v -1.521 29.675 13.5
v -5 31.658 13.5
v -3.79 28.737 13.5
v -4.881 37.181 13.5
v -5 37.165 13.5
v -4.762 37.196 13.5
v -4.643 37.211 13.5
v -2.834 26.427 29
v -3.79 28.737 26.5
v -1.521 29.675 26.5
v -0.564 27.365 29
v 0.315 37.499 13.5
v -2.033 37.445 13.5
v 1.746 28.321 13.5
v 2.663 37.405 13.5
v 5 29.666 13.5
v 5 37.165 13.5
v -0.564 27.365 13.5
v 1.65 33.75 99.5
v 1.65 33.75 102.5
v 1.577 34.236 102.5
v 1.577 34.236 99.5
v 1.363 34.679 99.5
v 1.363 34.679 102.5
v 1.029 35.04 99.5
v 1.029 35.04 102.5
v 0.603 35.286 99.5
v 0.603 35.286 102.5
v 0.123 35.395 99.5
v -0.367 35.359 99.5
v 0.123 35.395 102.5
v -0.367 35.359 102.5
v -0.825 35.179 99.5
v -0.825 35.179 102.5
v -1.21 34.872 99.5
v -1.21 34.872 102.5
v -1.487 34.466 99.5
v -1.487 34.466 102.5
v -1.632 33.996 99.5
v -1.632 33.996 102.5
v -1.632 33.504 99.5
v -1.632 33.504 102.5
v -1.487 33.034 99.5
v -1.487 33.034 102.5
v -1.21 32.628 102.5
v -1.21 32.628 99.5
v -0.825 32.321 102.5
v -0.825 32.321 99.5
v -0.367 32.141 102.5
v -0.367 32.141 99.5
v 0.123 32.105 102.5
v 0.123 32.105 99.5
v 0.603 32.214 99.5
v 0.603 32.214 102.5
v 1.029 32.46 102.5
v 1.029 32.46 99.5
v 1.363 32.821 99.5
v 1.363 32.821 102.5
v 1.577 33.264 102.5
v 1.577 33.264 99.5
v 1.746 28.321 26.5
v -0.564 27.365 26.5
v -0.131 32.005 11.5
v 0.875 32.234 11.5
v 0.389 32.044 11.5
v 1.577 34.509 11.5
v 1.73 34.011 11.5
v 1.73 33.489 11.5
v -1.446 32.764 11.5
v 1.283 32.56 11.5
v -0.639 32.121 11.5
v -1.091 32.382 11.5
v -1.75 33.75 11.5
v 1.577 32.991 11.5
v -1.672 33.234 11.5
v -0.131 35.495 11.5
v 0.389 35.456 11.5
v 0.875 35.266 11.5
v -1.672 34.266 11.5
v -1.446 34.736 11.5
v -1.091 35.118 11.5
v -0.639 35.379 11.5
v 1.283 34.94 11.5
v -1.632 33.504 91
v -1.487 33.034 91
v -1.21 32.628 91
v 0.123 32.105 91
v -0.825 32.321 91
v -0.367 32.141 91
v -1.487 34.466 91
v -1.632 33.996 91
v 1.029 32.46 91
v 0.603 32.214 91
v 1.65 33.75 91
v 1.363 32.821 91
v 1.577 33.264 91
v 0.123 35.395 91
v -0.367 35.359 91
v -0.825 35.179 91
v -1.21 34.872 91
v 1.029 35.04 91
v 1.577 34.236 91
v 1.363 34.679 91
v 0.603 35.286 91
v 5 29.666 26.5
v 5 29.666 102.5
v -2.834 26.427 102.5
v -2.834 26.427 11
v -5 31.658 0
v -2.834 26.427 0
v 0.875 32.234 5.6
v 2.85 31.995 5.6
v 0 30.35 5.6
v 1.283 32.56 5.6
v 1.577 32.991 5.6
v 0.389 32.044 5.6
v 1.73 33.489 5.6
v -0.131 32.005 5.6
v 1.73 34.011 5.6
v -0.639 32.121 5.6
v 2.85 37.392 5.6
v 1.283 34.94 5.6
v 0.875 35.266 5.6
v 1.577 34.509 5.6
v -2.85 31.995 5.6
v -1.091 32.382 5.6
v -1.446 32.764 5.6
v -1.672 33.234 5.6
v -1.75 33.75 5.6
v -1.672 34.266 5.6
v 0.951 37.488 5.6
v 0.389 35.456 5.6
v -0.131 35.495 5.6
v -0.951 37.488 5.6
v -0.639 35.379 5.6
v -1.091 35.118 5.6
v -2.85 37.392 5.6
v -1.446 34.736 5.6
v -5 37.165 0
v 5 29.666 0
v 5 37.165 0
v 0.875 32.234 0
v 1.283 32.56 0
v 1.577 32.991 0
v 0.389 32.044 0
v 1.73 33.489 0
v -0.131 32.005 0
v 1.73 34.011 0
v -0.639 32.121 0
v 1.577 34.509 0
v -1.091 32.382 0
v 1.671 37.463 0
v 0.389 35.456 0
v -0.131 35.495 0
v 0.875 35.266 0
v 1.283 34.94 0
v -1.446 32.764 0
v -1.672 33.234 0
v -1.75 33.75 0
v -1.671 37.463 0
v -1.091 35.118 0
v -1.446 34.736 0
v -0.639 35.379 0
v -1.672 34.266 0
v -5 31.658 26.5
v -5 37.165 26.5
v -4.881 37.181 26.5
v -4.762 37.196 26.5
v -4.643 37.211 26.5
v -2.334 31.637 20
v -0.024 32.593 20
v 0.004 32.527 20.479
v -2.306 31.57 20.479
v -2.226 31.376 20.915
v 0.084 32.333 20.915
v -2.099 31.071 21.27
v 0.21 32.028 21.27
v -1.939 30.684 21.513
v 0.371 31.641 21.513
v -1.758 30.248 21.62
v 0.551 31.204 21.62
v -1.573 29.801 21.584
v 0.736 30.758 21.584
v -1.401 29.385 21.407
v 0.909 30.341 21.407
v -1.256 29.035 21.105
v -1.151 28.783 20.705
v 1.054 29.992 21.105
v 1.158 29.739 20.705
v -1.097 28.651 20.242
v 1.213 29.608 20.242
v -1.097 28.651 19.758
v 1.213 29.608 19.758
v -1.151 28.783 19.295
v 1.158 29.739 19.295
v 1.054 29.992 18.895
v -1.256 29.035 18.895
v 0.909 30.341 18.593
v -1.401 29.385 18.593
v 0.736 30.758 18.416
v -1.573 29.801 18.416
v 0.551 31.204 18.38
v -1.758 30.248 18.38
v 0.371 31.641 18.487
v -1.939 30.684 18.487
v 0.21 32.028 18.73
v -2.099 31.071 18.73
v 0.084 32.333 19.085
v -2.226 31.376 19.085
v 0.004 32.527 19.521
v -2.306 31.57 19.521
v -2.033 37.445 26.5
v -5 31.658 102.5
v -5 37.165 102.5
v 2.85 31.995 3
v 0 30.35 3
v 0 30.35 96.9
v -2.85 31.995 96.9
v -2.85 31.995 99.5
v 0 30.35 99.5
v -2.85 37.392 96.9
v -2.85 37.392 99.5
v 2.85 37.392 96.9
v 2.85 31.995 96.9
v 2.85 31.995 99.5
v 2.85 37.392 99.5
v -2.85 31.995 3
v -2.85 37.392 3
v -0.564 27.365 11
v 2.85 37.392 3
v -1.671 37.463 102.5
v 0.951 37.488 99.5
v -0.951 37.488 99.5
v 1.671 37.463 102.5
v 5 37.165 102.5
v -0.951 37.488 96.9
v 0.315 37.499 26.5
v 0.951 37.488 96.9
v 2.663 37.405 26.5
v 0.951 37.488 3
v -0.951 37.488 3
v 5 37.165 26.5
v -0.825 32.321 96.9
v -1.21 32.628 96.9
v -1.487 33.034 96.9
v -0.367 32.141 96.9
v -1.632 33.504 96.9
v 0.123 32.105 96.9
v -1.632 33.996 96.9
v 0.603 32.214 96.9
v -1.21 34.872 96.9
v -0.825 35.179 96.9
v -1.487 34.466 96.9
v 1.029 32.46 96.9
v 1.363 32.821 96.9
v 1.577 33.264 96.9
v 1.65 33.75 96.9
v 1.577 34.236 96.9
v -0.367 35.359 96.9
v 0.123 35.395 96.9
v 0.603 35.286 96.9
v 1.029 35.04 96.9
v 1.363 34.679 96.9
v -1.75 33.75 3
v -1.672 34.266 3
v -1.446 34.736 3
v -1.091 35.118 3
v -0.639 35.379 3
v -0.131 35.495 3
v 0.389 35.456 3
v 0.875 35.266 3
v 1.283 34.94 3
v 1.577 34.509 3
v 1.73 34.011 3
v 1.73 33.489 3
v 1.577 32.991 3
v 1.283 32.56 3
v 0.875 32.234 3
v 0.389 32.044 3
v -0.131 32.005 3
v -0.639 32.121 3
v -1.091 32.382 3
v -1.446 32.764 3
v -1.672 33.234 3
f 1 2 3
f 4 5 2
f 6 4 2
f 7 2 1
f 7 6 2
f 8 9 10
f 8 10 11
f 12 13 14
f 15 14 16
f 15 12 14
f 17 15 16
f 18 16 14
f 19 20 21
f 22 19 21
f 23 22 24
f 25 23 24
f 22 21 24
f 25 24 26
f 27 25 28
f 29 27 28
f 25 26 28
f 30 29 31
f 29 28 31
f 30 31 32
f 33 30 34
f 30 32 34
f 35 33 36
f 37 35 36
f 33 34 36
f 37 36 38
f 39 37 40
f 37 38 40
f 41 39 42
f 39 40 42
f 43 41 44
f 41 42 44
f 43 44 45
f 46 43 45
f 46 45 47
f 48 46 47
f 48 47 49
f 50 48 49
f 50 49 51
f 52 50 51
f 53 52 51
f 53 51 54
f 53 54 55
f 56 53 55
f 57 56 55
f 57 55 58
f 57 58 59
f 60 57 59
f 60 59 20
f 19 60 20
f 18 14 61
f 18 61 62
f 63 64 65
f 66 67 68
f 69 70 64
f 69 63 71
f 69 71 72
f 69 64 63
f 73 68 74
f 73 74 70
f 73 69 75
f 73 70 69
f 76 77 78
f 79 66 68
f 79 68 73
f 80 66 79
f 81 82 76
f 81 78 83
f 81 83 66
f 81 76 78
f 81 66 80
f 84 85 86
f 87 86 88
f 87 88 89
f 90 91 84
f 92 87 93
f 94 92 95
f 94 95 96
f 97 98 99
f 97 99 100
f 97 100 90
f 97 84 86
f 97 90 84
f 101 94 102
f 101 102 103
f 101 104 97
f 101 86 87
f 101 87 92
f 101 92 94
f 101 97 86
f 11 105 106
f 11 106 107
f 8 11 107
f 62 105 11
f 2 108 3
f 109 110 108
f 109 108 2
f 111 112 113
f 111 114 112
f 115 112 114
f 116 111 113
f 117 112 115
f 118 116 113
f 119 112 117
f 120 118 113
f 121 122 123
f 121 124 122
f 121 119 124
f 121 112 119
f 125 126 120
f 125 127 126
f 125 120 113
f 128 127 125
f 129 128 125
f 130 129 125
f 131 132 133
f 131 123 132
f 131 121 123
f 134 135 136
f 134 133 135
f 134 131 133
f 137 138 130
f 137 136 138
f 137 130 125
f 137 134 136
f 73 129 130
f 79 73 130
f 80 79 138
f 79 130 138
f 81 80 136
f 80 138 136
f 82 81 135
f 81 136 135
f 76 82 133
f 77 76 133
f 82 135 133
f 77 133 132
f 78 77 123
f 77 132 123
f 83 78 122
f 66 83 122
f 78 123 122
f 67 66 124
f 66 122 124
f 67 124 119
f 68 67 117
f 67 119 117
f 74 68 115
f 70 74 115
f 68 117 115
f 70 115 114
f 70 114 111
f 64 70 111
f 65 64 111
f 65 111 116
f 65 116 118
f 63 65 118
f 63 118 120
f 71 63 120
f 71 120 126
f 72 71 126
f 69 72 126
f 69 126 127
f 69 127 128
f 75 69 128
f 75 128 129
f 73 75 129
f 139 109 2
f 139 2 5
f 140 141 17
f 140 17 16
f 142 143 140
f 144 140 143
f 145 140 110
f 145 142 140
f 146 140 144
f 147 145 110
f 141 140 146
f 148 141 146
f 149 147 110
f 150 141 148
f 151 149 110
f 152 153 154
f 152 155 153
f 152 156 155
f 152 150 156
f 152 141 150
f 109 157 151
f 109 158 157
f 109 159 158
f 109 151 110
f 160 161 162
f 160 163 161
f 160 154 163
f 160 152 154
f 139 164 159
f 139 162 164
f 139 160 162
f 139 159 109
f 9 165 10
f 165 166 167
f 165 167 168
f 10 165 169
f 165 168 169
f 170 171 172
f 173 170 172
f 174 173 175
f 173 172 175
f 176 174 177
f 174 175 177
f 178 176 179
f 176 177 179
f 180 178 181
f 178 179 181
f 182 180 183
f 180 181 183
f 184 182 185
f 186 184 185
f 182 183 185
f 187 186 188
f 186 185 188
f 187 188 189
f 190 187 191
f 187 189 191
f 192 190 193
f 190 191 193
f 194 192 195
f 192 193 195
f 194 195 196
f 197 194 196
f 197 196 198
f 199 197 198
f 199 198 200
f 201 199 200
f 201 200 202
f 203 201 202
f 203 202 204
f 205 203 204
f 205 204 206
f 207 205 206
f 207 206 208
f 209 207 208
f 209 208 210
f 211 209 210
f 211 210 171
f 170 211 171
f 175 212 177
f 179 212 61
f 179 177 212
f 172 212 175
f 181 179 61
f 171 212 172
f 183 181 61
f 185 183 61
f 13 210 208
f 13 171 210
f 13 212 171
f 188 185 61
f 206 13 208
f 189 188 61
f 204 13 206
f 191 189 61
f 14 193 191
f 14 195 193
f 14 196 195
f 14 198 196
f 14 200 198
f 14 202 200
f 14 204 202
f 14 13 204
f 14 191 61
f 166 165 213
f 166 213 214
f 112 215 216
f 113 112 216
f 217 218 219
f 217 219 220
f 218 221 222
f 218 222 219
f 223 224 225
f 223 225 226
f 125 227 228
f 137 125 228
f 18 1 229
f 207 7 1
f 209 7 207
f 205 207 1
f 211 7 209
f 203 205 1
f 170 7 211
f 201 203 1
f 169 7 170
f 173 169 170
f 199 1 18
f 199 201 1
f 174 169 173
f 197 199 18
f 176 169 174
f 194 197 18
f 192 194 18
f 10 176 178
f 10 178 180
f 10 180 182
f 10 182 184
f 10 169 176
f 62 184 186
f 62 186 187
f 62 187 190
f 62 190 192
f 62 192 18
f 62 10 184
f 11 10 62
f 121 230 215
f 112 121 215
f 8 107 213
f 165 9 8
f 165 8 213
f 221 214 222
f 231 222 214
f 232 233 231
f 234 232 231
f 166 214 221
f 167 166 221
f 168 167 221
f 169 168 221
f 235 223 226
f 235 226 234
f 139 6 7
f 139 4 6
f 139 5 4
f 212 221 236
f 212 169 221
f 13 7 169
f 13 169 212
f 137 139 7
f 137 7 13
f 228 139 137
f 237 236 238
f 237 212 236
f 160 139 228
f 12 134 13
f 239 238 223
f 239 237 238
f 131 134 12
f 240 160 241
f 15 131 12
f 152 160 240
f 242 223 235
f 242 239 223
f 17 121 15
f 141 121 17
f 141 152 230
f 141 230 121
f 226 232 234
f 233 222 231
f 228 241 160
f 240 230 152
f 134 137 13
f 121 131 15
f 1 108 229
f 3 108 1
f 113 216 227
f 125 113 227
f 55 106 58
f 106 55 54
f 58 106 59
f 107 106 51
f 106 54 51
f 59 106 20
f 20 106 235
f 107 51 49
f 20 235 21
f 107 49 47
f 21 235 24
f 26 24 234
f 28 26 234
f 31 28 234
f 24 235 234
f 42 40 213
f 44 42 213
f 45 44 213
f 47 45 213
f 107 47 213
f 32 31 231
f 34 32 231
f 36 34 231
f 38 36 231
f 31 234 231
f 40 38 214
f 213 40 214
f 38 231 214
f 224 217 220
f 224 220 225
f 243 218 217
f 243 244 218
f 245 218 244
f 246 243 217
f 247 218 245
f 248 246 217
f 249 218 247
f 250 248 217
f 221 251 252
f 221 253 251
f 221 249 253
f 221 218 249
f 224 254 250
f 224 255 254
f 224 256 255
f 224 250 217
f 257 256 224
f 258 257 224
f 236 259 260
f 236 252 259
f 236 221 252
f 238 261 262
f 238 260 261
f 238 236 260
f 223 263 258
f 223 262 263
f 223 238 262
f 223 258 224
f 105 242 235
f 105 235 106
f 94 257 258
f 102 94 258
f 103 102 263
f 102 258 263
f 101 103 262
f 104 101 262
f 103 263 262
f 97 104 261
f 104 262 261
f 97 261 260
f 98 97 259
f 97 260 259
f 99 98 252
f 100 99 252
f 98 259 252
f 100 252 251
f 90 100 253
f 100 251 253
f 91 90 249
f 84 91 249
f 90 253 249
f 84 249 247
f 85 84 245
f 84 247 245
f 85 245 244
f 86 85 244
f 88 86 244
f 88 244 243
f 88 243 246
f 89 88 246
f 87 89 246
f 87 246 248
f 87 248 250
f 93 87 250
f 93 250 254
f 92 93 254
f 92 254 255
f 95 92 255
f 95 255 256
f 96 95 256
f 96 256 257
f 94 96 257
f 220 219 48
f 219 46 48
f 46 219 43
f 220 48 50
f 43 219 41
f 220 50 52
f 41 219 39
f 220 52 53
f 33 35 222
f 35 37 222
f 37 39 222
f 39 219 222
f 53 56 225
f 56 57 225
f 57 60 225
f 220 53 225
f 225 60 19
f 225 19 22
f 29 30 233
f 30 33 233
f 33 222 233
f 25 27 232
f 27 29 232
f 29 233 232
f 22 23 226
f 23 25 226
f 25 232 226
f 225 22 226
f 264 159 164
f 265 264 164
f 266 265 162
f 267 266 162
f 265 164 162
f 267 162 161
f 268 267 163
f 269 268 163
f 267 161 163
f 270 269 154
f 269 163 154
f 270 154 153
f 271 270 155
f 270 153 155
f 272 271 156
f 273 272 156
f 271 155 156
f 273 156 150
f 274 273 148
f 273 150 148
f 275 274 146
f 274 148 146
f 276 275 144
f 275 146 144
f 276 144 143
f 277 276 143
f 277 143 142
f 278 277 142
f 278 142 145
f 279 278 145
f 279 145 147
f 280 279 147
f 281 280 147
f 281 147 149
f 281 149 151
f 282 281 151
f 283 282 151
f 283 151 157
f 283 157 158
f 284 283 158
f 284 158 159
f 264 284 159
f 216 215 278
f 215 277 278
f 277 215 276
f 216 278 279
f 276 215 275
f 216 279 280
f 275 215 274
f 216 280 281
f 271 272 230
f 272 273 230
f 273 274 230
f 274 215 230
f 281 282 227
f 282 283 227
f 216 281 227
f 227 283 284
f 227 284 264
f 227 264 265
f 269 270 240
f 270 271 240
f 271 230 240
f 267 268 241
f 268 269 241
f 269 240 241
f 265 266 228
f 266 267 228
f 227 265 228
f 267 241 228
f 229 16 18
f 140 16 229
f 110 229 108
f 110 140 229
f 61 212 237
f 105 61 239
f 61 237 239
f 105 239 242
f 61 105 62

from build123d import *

# Parameters (mm, degrees)
BOSS_EXTRU_2_DEPTH       = 102.5
ESQUISSE8_R              = 1.75
ENL_V_MAT_EXTRU_5_DEPTH  = 11.5
ENL_V_START              = -3
ENL_V_MAT_EXTRU_6_DEPTH  = 2.6
ENL_V_START_2            = -89
ENL_V_MAT_EXTRU_11_DEPTH = 13
ESQUISSE15_R             = 1.625
ENL_V_MAT_EXTRU_12_DEPTH = 109.858621468
CHANFREIN1_SIZE          = 2.5
ESQUISSE16_R             = 1.65
ENL_V_MAT_EXTRU_13_DEPTH = 11.5
ENL_V_START_3            = -5.6
ENL_V_MAT_EXTRU_14_DEPTH = 2.6


with BuildPart() as part:
    # Esquisse3 → Boss.-Extru.2 (new body)
    with BuildSketch(Plane.XY):
        with BuildLine():
            Line((5, 29.665669478), (-2.833530831, 26.427314208))
            Line((-2.833530831, 26.427314208), (-5, 31.657633458))
            Line((-5, 31.657633458), (-5, 37.165171868))
            ThreePointArc((-5, 37.165171868), (0, 37.5), (5, 37.165171868))
            Line((5, 37.165171868), (5, 29.665669478))
        make_face()
    extrude(amount=BOSS_EXTRU_2_DEPTH)

    # Esquisse8 → Enlèv. mat.-Extru.5 (cut)
    with BuildSketch(Plane(origin=(0, 0, 0), x_dir=(-1, 0, 0), z_dir=(0, 0, -1))):
        with Locations((0, 33.75)):
            Circle(ESQUISSE8_R)
    extrude(amount=-ENL_V_MAT_EXTRU_5_DEPTH, mode=Mode.SUBTRACT)

    # Esquisse9 → Enlèv. mat.-Extru.6 (cut)
    with BuildSketch(Plane(origin=(0, 0, 0), x_dir=(-1, 0, 0), z_dir=(0, 0, -1)).offset(ENL_V_START)):
        with BuildLine():
            Line((-2.85, 37.391543162), (-2.85, 31.995448267))
            Line((-2.85, 31.995448267), (0, 30.35))
            Line((0, 30.35), (2.85, 31.995448267))
            Line((2.85, 31.995448267), (2.85, 37.391543162))
            ThreePointArc((2.85, 37.391543162), (0, 37.5), (-2.85, 37.391543162))
        make_face()
    extrude(amount=-ENL_V_MAT_EXTRU_6_DEPTH, mode=Mode.SUBTRACT)

    # Esquisse14 → Enlèv. mat.-Extru.11 (cut)
    with BuildSketch(Plane.XY.offset(102.5).offset(ENL_V_START_2)):
        with BuildLine():
            Line((-2.833530831, 26.427314208), (-0.564385746, 27.365371146))
            Line((-0.564385746, 27.365371146), (-4.642779542, 37.211484761))
            ThreePointArc((-4.642779542, 37.211484761), (-4.821445379, 37.188757232), (-5, 37.165171868))
            Line((-5, 37.165171868), (-5, 31.657633458))
            Line((-5, 31.657633458), (-2.833530831, 26.427314208))
        make_face()
        with BuildLine():
            Line((1.745788964, 28.320930853), (-0.564385746, 27.365371146))
            Line((-0.564385746, 27.365371146), (5, 29.665669478))
            Line((5, 29.665669478), (5, 37.165171868))
            ThreePointArc((5, 37.165171868), (1.48984988, 37.470392943), (-2.03345257, 37.444827021))
            Line((-2.03345257, 37.444827021), (1.745788964, 28.320930853))
        make_face()
    extrude(amount=ENL_V_MAT_EXTRU_11_DEPTH, mode=Mode.SUBTRACT)

    # Esquisse15 → Enlèv. mat.-Extru.12 (cut, through all)
    with BuildSketch(Plane(origin=(11.503085218, 4.764733906, 0), x_dir=(0, 0, -1), z_dir=(0.9238795325112864, 0.38268343236509095, 0))):
        with Locations(Location((-20, 28.49654364, 0), (0, 0, 90))):
            Circle(ESQUISSE15_R)
    extrude(amount=-ENL_V_MAT_EXTRU_12_DEPTH, mode=Mode.SUBTRACT)

    # Chanfrein1
    # the kernel refuses this chamfer: 2.5 mm, written as the material it takes off along each edge
    with BuildSketch(Plane(origin=(-8.775058658, 23.971106609, 13.5), x_dir=(0.010504495520027614, -0.025410210633805018, -0.9996219169112968), z_dir=(0.924146227220892, 0.38203893873974615, 0))) as chanfrein1_piece_1_section:
        Polygon((CHANFREIN1_SIZE * 0.999621916911, CHANFREIN1_SIZE * 0.0274958766106), (-CHANFREIN1_SIZE * 0.0274958766106, CHANFREIN1_SIZE * 0.999621916911), (0, 0), align=None)
    chanfrein1_piece_1 = extrude(amount=8.884603616, mode=Mode.PRIVATE)
    chanfrein1_piece_1 = split(chanfrein1_piece_1, bisect_by=Plane(origin=(-0.88361638, 28.136062073, 12.666666667), z_dir=(-0.9238795325112863, -0.382683432365091, 0)), keep=Keep.TOP, mode=Mode.PRIVATE)
    add(chanfrein1_piece_1, mode=Mode.SUBTRACT)
    with BuildSketch(Plane(origin=(-8.775058658, 23.971106609, 26.5), x_dir=(-0.38189449627778244, 0.9237968231608907, -0.027495876610586317), z_dir=(0.924146227220892, 0.38203893873974615, 0))) as chanfrein1_piece_2_section:
        Polygon((CHANFREIN1_SIZE * 0.999621916911, CHANFREIN1_SIZE * 0.0274958766106), (-CHANFREIN1_SIZE * 0.0274958766106, CHANFREIN1_SIZE * 0.999621916911), (0, 0), align=None)
    chanfrein1_piece_2 = extrude(amount=8.884603616, mode=Mode.PRIVATE)
    chanfrein1_piece_2 = split(chanfrein1_piece_2, bisect_by=Plane(origin=(-0.88361638, 28.136062073, 27.333333333), z_dir=(-0.9238795325112863, -0.382683432365091, 0)), keep=Keep.TOP, mode=Mode.PRIVATE)
    add(chanfrein1_piece_2, mode=Mode.SUBTRACT)

    # Esquisse16 → Enlèv. mat.-Extru.13 (cut)
    with BuildSketch(Plane.XY.offset(102.5)):
        with Locations((0, 33.75)):
            Circle(ESQUISSE16_R)
    extrude(amount=-ENL_V_MAT_EXTRU_13_DEPTH, mode=Mode.SUBTRACT)

    # Esquisse17 → Enlèv. mat.-Extru.14 (cut)
    with BuildSketch(Plane.XY.offset(102.5).offset(ENL_V_START_3)):
        with BuildLine():
            Line((-2.85, 37.391543162), (-2.85, 31.995448267))
            Line((-2.85, 31.995448267), (0, 30.35))
            Line((0, 30.35), (2.85, 31.995448267))
            Line((2.85, 31.995448267), (2.85, 37.391543162))
            ThreePointArc((2.85, 37.391543162), (0, 37.5), (-2.85, 37.391543162))
        make_face()
    extrude(amount=ENL_V_MAT_EXTRU_14_DEPTH, mode=Mode.SUBTRACT)


solid = part.part
